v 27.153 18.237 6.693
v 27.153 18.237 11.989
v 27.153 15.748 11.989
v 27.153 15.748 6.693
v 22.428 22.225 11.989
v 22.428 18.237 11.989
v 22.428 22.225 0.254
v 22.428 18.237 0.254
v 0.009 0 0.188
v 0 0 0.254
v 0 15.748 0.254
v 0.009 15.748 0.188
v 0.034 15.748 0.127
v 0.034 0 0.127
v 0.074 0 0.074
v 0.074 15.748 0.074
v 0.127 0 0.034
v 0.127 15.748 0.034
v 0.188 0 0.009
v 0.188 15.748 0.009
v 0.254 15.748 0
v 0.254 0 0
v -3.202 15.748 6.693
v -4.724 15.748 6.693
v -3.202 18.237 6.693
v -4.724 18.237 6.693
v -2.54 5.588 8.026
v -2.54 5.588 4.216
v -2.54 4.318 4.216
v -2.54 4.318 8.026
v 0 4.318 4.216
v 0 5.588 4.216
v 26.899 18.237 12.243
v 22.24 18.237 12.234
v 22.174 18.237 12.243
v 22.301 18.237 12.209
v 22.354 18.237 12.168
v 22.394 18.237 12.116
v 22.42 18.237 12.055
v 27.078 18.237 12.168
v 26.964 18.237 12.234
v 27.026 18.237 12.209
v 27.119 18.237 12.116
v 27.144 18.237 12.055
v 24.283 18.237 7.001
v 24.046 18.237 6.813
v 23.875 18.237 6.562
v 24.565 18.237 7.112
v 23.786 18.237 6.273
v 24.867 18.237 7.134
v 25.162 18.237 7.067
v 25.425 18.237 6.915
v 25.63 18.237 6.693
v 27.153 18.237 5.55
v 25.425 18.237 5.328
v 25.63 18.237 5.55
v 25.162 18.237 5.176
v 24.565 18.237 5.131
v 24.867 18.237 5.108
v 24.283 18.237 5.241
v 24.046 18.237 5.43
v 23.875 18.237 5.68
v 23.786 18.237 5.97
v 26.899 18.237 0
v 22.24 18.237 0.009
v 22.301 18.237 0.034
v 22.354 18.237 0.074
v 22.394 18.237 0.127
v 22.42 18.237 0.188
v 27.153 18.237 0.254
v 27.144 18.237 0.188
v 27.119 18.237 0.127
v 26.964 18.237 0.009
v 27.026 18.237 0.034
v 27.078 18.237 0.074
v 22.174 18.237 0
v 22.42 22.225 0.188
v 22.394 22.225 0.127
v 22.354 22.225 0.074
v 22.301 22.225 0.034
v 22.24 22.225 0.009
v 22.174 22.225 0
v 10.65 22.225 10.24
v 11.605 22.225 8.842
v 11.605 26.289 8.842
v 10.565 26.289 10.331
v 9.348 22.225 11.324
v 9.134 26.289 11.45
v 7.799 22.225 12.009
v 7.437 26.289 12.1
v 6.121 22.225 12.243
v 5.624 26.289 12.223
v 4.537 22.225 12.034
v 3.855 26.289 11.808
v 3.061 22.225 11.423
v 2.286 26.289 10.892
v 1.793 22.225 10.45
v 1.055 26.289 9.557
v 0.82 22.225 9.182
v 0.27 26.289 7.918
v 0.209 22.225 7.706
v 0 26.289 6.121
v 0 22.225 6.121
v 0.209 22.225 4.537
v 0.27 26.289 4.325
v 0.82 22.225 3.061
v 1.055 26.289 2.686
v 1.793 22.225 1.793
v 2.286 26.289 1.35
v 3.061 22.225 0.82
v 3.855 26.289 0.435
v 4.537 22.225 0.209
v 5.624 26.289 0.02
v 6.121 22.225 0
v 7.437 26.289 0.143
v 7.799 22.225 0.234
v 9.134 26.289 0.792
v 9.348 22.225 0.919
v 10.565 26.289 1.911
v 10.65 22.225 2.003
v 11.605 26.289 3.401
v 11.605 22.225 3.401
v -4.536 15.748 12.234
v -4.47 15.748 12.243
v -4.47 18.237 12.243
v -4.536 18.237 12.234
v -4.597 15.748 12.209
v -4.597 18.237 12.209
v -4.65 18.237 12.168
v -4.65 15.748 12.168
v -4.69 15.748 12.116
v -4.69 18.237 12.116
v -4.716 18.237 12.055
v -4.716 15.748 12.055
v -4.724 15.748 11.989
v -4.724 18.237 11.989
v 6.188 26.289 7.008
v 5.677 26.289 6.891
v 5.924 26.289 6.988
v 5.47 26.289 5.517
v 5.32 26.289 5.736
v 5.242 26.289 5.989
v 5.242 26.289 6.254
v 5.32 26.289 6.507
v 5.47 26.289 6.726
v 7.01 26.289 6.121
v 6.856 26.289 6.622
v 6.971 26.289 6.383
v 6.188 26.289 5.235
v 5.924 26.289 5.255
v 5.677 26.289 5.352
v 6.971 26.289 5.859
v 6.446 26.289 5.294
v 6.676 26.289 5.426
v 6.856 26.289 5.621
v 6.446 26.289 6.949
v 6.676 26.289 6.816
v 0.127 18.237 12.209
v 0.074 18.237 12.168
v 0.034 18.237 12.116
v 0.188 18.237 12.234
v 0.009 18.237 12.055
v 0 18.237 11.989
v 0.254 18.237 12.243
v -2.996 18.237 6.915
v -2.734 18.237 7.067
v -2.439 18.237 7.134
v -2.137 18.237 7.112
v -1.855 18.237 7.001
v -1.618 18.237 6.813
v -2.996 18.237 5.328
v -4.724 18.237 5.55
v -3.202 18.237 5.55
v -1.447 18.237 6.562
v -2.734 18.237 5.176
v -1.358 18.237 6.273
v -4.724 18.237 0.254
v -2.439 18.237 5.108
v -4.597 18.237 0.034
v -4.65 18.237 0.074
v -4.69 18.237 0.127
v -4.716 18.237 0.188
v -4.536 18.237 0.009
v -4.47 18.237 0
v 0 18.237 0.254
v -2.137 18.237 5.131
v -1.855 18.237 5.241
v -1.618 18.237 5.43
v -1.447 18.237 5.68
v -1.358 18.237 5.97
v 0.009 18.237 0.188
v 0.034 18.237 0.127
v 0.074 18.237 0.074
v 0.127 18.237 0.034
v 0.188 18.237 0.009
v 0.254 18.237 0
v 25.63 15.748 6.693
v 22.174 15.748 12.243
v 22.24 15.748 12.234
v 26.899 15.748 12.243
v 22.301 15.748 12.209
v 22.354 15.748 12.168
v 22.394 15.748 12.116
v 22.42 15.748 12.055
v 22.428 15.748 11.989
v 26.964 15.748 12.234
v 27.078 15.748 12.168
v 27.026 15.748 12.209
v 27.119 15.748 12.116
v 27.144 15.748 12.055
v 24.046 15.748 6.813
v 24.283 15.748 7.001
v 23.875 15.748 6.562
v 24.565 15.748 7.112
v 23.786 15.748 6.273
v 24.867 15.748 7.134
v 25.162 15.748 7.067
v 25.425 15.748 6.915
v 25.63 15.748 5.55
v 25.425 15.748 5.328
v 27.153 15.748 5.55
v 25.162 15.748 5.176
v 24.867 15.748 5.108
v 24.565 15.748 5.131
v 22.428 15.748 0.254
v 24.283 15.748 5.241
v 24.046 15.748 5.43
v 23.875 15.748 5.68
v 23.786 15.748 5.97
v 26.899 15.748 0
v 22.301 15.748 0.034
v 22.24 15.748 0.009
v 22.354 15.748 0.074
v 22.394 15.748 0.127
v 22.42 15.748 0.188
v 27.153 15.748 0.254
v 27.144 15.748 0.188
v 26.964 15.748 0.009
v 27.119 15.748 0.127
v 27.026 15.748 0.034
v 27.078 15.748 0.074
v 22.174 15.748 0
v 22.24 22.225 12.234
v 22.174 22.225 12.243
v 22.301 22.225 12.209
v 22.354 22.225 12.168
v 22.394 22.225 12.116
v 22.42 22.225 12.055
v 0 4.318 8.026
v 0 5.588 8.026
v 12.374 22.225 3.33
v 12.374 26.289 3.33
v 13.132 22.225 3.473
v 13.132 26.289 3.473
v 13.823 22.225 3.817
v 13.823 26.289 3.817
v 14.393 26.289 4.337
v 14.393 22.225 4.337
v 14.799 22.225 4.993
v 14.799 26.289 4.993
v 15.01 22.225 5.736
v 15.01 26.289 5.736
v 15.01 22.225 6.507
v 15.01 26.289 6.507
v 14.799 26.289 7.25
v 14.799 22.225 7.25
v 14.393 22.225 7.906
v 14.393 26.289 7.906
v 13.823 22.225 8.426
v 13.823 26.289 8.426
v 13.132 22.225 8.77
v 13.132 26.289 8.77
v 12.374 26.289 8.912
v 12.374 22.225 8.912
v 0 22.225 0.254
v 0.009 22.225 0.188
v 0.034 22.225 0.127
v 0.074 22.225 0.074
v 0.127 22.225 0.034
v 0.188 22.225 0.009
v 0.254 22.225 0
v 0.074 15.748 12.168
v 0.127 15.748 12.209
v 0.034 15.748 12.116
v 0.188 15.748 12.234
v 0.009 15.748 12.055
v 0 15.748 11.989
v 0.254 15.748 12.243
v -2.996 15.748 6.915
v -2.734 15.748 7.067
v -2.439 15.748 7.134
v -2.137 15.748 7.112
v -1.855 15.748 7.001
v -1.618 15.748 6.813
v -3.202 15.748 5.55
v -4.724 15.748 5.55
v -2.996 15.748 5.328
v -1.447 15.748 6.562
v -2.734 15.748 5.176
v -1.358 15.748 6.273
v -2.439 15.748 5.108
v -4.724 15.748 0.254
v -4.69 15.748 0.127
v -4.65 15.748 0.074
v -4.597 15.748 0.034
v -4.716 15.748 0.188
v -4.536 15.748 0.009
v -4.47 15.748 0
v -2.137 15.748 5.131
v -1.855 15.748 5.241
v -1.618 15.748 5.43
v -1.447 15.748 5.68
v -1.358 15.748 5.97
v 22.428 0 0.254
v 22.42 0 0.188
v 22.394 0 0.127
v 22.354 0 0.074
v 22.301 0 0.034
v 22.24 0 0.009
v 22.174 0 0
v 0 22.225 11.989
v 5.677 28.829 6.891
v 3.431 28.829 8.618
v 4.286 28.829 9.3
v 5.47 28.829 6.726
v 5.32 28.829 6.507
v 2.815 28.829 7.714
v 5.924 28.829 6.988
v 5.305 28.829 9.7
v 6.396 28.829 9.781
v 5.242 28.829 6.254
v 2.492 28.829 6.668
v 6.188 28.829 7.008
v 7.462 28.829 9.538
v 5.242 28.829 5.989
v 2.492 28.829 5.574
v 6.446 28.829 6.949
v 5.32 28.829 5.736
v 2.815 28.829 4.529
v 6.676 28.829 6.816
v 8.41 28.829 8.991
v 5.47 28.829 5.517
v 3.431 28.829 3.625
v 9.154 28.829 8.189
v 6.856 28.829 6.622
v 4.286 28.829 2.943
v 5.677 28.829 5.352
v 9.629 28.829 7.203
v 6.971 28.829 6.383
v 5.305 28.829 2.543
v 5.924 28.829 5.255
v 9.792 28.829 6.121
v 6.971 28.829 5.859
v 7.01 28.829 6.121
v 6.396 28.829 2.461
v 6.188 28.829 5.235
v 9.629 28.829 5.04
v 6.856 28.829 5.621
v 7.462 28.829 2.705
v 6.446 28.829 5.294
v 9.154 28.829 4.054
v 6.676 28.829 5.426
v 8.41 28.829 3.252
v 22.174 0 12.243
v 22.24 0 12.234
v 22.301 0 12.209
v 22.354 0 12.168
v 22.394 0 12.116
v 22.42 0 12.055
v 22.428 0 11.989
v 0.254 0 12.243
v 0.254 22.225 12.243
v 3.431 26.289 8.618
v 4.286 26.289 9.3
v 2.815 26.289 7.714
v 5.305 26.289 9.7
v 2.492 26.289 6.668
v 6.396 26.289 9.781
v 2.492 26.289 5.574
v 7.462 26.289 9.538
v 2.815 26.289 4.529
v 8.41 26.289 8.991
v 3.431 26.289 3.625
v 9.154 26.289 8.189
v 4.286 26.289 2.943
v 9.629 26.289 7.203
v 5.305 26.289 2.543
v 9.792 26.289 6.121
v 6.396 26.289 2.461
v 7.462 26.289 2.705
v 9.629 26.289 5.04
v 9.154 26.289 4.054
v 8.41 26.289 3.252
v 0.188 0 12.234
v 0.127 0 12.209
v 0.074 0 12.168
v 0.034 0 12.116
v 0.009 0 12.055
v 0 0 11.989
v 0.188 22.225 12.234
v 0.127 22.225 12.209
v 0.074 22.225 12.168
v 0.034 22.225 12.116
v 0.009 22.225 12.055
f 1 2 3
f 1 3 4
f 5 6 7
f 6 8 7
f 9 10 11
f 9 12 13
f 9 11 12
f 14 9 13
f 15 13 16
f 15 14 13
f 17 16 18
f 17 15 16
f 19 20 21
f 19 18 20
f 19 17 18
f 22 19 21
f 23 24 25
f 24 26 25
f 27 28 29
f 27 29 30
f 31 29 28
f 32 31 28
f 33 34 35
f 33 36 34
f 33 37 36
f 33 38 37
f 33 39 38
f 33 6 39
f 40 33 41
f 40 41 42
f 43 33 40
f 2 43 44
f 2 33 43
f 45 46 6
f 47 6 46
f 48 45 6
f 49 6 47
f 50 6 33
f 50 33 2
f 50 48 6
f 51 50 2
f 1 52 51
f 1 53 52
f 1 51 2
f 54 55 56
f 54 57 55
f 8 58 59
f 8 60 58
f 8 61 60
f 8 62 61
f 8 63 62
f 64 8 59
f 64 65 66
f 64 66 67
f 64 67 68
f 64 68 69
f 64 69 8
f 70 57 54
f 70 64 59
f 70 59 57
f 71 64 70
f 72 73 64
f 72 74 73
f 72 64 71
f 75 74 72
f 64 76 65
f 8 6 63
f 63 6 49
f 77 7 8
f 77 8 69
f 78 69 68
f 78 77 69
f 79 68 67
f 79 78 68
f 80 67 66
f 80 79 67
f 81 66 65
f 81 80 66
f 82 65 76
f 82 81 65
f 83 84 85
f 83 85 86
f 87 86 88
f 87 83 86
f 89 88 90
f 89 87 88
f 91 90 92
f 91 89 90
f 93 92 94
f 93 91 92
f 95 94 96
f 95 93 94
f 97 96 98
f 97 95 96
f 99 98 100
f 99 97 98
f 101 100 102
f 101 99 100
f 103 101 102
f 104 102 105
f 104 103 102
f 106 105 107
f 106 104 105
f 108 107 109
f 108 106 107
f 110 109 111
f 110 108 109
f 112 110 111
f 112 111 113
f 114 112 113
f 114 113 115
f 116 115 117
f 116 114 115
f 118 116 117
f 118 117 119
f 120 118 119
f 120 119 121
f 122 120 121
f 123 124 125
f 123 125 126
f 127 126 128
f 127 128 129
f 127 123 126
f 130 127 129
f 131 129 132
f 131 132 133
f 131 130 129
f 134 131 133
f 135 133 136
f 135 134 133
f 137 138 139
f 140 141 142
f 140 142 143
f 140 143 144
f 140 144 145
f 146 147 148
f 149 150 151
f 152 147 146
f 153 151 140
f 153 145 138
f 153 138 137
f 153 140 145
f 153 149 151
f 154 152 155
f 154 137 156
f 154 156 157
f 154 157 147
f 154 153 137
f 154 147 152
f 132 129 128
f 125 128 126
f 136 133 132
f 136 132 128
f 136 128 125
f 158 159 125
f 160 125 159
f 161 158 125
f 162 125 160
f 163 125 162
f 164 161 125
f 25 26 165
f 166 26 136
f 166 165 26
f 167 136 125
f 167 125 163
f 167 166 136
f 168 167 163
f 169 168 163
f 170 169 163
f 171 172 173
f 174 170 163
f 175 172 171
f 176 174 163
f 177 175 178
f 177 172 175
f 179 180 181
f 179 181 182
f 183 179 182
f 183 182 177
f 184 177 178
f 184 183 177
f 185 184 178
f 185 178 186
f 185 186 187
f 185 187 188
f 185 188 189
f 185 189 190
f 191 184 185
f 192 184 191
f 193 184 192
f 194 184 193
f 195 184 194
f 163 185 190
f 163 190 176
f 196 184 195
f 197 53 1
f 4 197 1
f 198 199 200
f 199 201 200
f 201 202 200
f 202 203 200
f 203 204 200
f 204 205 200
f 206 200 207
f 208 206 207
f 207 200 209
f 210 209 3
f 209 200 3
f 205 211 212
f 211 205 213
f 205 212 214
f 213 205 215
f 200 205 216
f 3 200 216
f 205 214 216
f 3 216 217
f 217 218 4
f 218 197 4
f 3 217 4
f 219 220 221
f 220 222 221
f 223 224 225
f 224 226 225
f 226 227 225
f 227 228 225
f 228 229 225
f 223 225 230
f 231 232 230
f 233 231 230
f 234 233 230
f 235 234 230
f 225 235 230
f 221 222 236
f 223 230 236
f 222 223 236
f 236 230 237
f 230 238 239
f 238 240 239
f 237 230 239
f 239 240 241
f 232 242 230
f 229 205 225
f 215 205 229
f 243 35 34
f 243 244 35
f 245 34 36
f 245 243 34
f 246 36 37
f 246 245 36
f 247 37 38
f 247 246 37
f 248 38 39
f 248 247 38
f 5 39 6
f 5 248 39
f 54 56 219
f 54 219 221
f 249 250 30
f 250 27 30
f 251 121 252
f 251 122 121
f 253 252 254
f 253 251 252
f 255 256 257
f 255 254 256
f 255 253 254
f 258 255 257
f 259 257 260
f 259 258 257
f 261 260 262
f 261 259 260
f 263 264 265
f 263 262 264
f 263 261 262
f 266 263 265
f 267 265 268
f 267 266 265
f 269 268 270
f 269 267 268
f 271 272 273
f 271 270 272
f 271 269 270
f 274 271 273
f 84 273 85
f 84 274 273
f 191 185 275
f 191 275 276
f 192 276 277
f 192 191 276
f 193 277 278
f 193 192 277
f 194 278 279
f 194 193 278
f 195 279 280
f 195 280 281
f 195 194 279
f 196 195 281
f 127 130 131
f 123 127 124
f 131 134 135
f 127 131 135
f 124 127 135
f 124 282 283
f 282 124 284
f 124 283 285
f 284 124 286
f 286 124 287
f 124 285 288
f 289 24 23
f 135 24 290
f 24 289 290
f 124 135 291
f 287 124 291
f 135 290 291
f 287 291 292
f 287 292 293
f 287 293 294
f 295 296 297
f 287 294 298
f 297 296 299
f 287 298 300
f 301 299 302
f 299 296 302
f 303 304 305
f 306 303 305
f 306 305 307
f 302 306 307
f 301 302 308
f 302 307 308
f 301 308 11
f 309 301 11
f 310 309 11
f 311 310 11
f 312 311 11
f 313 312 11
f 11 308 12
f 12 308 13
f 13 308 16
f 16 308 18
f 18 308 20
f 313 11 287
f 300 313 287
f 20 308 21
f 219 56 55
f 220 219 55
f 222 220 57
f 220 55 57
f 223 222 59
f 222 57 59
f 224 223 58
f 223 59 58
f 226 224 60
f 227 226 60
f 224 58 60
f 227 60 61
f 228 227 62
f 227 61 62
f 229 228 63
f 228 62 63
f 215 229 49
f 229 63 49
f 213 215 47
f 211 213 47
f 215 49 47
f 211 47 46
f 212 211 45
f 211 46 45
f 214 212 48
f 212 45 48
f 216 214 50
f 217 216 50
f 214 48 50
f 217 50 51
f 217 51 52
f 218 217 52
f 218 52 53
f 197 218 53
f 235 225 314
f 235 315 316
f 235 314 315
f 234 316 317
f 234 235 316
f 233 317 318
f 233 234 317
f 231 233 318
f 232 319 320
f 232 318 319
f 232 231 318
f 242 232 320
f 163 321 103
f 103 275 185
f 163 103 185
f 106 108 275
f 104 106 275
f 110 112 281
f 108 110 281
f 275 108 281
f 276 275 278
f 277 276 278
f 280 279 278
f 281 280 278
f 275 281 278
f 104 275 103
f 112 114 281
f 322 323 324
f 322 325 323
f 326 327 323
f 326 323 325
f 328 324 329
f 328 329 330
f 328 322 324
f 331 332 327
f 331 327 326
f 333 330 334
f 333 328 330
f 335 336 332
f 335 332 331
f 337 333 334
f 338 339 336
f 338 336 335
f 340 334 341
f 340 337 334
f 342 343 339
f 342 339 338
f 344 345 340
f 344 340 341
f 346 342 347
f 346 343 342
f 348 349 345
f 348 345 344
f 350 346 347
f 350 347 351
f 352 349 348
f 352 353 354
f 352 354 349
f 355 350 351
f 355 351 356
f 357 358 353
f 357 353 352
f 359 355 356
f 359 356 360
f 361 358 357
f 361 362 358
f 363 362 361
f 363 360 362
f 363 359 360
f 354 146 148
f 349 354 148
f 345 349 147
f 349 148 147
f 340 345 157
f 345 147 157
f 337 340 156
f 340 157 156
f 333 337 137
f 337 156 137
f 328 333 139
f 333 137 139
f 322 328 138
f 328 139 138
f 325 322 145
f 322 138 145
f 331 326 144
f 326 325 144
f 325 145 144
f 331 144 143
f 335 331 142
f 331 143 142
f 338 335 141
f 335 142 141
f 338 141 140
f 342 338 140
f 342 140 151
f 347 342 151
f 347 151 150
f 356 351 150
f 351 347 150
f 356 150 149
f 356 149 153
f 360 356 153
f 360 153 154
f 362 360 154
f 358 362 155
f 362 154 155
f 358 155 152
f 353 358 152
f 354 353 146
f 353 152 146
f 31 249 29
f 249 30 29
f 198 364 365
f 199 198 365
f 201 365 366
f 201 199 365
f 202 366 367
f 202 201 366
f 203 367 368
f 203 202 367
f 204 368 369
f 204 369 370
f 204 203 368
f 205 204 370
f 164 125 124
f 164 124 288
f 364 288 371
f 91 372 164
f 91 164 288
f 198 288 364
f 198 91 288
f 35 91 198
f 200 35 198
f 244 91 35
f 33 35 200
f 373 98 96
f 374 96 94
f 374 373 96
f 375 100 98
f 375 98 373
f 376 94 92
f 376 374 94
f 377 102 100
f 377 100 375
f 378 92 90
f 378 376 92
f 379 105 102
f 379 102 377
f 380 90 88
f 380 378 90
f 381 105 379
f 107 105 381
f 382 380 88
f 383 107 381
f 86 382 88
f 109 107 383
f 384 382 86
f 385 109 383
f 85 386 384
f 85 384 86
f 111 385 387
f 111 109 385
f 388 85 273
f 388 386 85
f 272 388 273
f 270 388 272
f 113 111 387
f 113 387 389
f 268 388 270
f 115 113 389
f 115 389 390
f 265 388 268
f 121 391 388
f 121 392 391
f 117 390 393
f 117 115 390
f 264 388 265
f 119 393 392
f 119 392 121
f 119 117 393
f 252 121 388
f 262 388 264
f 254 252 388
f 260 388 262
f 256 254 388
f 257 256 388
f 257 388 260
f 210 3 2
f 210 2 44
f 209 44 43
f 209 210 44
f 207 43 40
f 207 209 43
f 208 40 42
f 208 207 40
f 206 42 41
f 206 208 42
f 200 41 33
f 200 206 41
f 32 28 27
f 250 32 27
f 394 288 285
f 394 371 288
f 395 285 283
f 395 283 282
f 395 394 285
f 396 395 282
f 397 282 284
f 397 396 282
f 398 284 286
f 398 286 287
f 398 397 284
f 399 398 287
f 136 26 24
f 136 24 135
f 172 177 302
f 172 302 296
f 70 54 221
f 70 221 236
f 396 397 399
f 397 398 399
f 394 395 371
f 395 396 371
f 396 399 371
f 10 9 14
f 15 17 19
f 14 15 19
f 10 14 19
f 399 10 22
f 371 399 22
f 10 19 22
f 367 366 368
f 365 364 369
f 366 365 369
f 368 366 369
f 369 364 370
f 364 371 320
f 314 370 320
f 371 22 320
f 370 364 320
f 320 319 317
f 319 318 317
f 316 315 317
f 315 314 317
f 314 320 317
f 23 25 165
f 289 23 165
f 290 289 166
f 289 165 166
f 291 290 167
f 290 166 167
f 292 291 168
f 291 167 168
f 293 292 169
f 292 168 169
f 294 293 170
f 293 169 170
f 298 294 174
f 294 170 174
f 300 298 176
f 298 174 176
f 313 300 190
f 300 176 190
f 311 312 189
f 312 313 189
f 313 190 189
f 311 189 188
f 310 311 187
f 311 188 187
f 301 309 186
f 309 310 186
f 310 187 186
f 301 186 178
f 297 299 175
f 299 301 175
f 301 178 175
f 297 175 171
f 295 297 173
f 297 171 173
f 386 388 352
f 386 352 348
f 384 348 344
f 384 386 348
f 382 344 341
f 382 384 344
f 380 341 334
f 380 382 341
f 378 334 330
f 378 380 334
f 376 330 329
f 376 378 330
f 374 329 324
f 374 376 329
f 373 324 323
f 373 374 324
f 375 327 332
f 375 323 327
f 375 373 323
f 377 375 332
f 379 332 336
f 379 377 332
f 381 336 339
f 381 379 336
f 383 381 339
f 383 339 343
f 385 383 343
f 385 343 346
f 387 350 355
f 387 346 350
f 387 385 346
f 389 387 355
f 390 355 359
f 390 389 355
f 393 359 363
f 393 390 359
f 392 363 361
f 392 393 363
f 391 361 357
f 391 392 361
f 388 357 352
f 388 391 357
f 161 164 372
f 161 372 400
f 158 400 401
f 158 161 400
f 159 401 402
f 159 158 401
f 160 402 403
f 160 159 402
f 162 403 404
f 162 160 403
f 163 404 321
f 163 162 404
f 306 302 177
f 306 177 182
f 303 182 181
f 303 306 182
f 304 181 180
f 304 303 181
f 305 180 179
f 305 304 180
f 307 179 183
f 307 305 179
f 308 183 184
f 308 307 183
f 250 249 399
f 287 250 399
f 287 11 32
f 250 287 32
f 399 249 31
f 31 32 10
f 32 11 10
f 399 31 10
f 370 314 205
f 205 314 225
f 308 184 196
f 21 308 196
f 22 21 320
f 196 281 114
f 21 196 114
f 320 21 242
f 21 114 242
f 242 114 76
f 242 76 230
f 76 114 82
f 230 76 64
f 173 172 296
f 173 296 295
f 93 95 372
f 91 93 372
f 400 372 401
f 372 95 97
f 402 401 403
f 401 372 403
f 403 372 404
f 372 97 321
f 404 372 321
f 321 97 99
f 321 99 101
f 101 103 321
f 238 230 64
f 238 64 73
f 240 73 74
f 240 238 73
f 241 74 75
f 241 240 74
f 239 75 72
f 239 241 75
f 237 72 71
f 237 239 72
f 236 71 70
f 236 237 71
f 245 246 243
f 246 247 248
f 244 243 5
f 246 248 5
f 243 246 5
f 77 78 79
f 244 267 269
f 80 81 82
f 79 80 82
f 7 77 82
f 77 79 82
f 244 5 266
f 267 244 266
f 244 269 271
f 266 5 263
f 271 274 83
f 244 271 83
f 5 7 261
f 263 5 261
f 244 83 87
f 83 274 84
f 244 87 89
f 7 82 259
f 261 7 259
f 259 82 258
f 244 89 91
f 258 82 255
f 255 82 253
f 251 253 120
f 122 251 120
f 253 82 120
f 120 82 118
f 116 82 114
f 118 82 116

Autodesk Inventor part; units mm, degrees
ref_plane "YZ Plane" through (0, 0, 0) normal (1, 0, 0) x (0, 1, 0)
sketch "Sketch1" plane through (0, 0, 0) normal (0, 0, 1) x (1, 0, 0)
  line L0 (0, 0) -> (22.4282, 0)
  line L1 (22.4282, 0) -> (22.4282, 22.225)
  line L2 (22.4282, 22.225) -> (0, 22.225)
  line L3 (0, 22.225) -> (0, 0)
  dimension "d0" = 22.4282
  dimension "d1" = 22.225
extrude "Extrusion1" add sketch "Sketch1" along normal blind 12.2428
ref_plane "Work Plane1" through (0, 18.2372, 0) normal (0, 1, 0) x (1, 0, 0)
sketch "Sketch2" plane through (0, 18.2372, 0) normal (0, 1, 0) x (1, 0, 0)
  line L0 (22.4282, -12.2428) -> (27.1526, -12.2428)
  line L1 (27.1526, 0) -> (22.4282, 0)
  line L2 (22.4282, 0) -> (22.4282, -12.2428)
  arc A0 (25.6304, -5.5499) -> (25.6304, -6.6929) centre (24.7904, -6.1214) ccw
  line L3 (22.4282, 0) -> (22.4282, -12.2428) projected
  line L4 (25.6304, -6.6929) -> (27.1526, -6.6929)
  line L5 (25.6304, -5.5499) -> (27.1526, -5.5499)
  line L6 (27.1526, -12.2428) -> (27.1526, -6.6929)
  line L7 (27.1526, -5.5499) -> (27.1526, 0)
  point P0 (0, 0)
  point P1 (22.4282, -6.1214)
  point P2 (24.7904, 0)
  point P3 (27.1526, -6.1214)
  dimension "d6" = 2.032
  dimension "d23" = 1.143
  dimension "d24" = 0.5715
  dimension "d25" = 4.7244
extrude "Extrusion2" add sketch "Sketch2" against normal blind 2.4892
ref_plane "Work Plane2" through (11.2141, 0, 12.2428) normal (1, 0, 0) x (0, 0, -1)
mirror "Mirror1" about plane through (11.2141, 0, 12.2428) normal (1, 0, 0) of "Extrusion2"
sketch "Sketch3" plane through (0, 22.225, 0) normal (0, 1, 0) x (1, 0, 0)
  arc A0 (11.6052, -3.4011) -> (11.6052, -8.8417) centre (6.1214, -6.1214) ccw
  line L0 (22.4282, 0) -> (0, 0) projected
  line L1 (0, 0) -> (0, -12.2428) projected
  line L2 (22.4282, -12.2428) -> (0, -12.2428) projected
  arc A1 (11.6052, -8.8417) -> (11.6052, -3.4011) centre (12.2428, -6.1214) ccw
  dimension "d9" = 5.588
extrude "Extrusion3" add sketch "Sketch3" along normal blind 4.064 contours A1 A0
sketch "Sketch4" plane through (0, 26.289, 0) normal (0, 1, 0) x (1, 0, 0)
  arc A0 (6.1214, -12.2428) -> (11.6052, -8.8417) centre (6.1214, -6.1214) ccw projected
  circle A1 centre (6.1214, -6.1214) radius 3.6703
  circle A2 centre (6.1214, -6.1214) radius 0.889
  point P0 (0, 0)
  dimension "d12" = 7.3406
  dimension "d15" = 1.778
extrude "Extrusion4" add sketch "Sketch4" along normal blind 2.54
sketch "Sketch5" plane through (0, 0, 0) normal (-1, 0, 0) x (0, 0, 1)
  circle A0 centre (4.8514, 4.953) radius 0.635
  circle A1 centre (6.1214, 4.953) radius 0.635
  circle A2 centre (7.3914, 4.953) radius 0.635
  line L0 (4.8514, 4.318) -> (7.3914, 4.318) construction
  line L1 (0, 0) -> (12.2428, 0) projected
  point P0 (6.1214, 0)
  point P1 (6.7564, 4.953)
  point P2 (5.4864, 4.953)
  dimension "d17" = 1.27
  dimension "d18" = 1.27
  dimension "d16" = 1.27
  dimension "d19" = 4.318
extrude "Extrusion5" add sketch "Sketch5" along normal blind 2.54
fillet "Fillet1" radius 0.254 12 edges at (22.4282, 7.874, 0) (22.4282, 20.2311, 0) (22.4282, 20.2311, 12.2428) (22.4282, 7.874, 12.2428) (27.1526, 16.9926, 12.2428) (27.1526, 16.9926, 0) (-4.7244, 16.9926, 0) (-4.7244, 16.9926, 12.2428) (0, 7.874, 12.2428) (0, 7.874, 0) (0, 20.2311, 0) (0, 20.2311, 12.2428)
sketch "Sketch6" plane through (-2.54, 4.953, 4.8514) normal (-1, 0, 0) x (0, 0, 1)
  circle A0 centre (0, 0) radius 0.635 projected
  circle A1 centre (2.54, 0) radius 0.635 projected
  line L0 (-0.635, 0.635) -> (3.175, 0.635)
  line L1 (3.175, 0.635) -> (3.175, -0.635)
  line L2 (3.175, -0.635) -> (-0.635, -0.635)
  line L3 (-0.635, -0.635) -> (-0.635, 0.635)
  circle A2 centre (0, 0) radius 0.635 projected
  circle A3 centre (2.54, 0) radius 0.635 projected
  point P0 (-4.8514, -4.953)
  point P1 (0.635, 0)
  point P2 (1.905, 0)
extrude "Extrusion6" add sketch "Sketch6" against normal up to surface (2.54 mm away)
equation "\"d24\" = 0.5 * d23"
equation "\"d17\" = d16"
equation "\"d18\" = d16"
properties part number "Servo"
